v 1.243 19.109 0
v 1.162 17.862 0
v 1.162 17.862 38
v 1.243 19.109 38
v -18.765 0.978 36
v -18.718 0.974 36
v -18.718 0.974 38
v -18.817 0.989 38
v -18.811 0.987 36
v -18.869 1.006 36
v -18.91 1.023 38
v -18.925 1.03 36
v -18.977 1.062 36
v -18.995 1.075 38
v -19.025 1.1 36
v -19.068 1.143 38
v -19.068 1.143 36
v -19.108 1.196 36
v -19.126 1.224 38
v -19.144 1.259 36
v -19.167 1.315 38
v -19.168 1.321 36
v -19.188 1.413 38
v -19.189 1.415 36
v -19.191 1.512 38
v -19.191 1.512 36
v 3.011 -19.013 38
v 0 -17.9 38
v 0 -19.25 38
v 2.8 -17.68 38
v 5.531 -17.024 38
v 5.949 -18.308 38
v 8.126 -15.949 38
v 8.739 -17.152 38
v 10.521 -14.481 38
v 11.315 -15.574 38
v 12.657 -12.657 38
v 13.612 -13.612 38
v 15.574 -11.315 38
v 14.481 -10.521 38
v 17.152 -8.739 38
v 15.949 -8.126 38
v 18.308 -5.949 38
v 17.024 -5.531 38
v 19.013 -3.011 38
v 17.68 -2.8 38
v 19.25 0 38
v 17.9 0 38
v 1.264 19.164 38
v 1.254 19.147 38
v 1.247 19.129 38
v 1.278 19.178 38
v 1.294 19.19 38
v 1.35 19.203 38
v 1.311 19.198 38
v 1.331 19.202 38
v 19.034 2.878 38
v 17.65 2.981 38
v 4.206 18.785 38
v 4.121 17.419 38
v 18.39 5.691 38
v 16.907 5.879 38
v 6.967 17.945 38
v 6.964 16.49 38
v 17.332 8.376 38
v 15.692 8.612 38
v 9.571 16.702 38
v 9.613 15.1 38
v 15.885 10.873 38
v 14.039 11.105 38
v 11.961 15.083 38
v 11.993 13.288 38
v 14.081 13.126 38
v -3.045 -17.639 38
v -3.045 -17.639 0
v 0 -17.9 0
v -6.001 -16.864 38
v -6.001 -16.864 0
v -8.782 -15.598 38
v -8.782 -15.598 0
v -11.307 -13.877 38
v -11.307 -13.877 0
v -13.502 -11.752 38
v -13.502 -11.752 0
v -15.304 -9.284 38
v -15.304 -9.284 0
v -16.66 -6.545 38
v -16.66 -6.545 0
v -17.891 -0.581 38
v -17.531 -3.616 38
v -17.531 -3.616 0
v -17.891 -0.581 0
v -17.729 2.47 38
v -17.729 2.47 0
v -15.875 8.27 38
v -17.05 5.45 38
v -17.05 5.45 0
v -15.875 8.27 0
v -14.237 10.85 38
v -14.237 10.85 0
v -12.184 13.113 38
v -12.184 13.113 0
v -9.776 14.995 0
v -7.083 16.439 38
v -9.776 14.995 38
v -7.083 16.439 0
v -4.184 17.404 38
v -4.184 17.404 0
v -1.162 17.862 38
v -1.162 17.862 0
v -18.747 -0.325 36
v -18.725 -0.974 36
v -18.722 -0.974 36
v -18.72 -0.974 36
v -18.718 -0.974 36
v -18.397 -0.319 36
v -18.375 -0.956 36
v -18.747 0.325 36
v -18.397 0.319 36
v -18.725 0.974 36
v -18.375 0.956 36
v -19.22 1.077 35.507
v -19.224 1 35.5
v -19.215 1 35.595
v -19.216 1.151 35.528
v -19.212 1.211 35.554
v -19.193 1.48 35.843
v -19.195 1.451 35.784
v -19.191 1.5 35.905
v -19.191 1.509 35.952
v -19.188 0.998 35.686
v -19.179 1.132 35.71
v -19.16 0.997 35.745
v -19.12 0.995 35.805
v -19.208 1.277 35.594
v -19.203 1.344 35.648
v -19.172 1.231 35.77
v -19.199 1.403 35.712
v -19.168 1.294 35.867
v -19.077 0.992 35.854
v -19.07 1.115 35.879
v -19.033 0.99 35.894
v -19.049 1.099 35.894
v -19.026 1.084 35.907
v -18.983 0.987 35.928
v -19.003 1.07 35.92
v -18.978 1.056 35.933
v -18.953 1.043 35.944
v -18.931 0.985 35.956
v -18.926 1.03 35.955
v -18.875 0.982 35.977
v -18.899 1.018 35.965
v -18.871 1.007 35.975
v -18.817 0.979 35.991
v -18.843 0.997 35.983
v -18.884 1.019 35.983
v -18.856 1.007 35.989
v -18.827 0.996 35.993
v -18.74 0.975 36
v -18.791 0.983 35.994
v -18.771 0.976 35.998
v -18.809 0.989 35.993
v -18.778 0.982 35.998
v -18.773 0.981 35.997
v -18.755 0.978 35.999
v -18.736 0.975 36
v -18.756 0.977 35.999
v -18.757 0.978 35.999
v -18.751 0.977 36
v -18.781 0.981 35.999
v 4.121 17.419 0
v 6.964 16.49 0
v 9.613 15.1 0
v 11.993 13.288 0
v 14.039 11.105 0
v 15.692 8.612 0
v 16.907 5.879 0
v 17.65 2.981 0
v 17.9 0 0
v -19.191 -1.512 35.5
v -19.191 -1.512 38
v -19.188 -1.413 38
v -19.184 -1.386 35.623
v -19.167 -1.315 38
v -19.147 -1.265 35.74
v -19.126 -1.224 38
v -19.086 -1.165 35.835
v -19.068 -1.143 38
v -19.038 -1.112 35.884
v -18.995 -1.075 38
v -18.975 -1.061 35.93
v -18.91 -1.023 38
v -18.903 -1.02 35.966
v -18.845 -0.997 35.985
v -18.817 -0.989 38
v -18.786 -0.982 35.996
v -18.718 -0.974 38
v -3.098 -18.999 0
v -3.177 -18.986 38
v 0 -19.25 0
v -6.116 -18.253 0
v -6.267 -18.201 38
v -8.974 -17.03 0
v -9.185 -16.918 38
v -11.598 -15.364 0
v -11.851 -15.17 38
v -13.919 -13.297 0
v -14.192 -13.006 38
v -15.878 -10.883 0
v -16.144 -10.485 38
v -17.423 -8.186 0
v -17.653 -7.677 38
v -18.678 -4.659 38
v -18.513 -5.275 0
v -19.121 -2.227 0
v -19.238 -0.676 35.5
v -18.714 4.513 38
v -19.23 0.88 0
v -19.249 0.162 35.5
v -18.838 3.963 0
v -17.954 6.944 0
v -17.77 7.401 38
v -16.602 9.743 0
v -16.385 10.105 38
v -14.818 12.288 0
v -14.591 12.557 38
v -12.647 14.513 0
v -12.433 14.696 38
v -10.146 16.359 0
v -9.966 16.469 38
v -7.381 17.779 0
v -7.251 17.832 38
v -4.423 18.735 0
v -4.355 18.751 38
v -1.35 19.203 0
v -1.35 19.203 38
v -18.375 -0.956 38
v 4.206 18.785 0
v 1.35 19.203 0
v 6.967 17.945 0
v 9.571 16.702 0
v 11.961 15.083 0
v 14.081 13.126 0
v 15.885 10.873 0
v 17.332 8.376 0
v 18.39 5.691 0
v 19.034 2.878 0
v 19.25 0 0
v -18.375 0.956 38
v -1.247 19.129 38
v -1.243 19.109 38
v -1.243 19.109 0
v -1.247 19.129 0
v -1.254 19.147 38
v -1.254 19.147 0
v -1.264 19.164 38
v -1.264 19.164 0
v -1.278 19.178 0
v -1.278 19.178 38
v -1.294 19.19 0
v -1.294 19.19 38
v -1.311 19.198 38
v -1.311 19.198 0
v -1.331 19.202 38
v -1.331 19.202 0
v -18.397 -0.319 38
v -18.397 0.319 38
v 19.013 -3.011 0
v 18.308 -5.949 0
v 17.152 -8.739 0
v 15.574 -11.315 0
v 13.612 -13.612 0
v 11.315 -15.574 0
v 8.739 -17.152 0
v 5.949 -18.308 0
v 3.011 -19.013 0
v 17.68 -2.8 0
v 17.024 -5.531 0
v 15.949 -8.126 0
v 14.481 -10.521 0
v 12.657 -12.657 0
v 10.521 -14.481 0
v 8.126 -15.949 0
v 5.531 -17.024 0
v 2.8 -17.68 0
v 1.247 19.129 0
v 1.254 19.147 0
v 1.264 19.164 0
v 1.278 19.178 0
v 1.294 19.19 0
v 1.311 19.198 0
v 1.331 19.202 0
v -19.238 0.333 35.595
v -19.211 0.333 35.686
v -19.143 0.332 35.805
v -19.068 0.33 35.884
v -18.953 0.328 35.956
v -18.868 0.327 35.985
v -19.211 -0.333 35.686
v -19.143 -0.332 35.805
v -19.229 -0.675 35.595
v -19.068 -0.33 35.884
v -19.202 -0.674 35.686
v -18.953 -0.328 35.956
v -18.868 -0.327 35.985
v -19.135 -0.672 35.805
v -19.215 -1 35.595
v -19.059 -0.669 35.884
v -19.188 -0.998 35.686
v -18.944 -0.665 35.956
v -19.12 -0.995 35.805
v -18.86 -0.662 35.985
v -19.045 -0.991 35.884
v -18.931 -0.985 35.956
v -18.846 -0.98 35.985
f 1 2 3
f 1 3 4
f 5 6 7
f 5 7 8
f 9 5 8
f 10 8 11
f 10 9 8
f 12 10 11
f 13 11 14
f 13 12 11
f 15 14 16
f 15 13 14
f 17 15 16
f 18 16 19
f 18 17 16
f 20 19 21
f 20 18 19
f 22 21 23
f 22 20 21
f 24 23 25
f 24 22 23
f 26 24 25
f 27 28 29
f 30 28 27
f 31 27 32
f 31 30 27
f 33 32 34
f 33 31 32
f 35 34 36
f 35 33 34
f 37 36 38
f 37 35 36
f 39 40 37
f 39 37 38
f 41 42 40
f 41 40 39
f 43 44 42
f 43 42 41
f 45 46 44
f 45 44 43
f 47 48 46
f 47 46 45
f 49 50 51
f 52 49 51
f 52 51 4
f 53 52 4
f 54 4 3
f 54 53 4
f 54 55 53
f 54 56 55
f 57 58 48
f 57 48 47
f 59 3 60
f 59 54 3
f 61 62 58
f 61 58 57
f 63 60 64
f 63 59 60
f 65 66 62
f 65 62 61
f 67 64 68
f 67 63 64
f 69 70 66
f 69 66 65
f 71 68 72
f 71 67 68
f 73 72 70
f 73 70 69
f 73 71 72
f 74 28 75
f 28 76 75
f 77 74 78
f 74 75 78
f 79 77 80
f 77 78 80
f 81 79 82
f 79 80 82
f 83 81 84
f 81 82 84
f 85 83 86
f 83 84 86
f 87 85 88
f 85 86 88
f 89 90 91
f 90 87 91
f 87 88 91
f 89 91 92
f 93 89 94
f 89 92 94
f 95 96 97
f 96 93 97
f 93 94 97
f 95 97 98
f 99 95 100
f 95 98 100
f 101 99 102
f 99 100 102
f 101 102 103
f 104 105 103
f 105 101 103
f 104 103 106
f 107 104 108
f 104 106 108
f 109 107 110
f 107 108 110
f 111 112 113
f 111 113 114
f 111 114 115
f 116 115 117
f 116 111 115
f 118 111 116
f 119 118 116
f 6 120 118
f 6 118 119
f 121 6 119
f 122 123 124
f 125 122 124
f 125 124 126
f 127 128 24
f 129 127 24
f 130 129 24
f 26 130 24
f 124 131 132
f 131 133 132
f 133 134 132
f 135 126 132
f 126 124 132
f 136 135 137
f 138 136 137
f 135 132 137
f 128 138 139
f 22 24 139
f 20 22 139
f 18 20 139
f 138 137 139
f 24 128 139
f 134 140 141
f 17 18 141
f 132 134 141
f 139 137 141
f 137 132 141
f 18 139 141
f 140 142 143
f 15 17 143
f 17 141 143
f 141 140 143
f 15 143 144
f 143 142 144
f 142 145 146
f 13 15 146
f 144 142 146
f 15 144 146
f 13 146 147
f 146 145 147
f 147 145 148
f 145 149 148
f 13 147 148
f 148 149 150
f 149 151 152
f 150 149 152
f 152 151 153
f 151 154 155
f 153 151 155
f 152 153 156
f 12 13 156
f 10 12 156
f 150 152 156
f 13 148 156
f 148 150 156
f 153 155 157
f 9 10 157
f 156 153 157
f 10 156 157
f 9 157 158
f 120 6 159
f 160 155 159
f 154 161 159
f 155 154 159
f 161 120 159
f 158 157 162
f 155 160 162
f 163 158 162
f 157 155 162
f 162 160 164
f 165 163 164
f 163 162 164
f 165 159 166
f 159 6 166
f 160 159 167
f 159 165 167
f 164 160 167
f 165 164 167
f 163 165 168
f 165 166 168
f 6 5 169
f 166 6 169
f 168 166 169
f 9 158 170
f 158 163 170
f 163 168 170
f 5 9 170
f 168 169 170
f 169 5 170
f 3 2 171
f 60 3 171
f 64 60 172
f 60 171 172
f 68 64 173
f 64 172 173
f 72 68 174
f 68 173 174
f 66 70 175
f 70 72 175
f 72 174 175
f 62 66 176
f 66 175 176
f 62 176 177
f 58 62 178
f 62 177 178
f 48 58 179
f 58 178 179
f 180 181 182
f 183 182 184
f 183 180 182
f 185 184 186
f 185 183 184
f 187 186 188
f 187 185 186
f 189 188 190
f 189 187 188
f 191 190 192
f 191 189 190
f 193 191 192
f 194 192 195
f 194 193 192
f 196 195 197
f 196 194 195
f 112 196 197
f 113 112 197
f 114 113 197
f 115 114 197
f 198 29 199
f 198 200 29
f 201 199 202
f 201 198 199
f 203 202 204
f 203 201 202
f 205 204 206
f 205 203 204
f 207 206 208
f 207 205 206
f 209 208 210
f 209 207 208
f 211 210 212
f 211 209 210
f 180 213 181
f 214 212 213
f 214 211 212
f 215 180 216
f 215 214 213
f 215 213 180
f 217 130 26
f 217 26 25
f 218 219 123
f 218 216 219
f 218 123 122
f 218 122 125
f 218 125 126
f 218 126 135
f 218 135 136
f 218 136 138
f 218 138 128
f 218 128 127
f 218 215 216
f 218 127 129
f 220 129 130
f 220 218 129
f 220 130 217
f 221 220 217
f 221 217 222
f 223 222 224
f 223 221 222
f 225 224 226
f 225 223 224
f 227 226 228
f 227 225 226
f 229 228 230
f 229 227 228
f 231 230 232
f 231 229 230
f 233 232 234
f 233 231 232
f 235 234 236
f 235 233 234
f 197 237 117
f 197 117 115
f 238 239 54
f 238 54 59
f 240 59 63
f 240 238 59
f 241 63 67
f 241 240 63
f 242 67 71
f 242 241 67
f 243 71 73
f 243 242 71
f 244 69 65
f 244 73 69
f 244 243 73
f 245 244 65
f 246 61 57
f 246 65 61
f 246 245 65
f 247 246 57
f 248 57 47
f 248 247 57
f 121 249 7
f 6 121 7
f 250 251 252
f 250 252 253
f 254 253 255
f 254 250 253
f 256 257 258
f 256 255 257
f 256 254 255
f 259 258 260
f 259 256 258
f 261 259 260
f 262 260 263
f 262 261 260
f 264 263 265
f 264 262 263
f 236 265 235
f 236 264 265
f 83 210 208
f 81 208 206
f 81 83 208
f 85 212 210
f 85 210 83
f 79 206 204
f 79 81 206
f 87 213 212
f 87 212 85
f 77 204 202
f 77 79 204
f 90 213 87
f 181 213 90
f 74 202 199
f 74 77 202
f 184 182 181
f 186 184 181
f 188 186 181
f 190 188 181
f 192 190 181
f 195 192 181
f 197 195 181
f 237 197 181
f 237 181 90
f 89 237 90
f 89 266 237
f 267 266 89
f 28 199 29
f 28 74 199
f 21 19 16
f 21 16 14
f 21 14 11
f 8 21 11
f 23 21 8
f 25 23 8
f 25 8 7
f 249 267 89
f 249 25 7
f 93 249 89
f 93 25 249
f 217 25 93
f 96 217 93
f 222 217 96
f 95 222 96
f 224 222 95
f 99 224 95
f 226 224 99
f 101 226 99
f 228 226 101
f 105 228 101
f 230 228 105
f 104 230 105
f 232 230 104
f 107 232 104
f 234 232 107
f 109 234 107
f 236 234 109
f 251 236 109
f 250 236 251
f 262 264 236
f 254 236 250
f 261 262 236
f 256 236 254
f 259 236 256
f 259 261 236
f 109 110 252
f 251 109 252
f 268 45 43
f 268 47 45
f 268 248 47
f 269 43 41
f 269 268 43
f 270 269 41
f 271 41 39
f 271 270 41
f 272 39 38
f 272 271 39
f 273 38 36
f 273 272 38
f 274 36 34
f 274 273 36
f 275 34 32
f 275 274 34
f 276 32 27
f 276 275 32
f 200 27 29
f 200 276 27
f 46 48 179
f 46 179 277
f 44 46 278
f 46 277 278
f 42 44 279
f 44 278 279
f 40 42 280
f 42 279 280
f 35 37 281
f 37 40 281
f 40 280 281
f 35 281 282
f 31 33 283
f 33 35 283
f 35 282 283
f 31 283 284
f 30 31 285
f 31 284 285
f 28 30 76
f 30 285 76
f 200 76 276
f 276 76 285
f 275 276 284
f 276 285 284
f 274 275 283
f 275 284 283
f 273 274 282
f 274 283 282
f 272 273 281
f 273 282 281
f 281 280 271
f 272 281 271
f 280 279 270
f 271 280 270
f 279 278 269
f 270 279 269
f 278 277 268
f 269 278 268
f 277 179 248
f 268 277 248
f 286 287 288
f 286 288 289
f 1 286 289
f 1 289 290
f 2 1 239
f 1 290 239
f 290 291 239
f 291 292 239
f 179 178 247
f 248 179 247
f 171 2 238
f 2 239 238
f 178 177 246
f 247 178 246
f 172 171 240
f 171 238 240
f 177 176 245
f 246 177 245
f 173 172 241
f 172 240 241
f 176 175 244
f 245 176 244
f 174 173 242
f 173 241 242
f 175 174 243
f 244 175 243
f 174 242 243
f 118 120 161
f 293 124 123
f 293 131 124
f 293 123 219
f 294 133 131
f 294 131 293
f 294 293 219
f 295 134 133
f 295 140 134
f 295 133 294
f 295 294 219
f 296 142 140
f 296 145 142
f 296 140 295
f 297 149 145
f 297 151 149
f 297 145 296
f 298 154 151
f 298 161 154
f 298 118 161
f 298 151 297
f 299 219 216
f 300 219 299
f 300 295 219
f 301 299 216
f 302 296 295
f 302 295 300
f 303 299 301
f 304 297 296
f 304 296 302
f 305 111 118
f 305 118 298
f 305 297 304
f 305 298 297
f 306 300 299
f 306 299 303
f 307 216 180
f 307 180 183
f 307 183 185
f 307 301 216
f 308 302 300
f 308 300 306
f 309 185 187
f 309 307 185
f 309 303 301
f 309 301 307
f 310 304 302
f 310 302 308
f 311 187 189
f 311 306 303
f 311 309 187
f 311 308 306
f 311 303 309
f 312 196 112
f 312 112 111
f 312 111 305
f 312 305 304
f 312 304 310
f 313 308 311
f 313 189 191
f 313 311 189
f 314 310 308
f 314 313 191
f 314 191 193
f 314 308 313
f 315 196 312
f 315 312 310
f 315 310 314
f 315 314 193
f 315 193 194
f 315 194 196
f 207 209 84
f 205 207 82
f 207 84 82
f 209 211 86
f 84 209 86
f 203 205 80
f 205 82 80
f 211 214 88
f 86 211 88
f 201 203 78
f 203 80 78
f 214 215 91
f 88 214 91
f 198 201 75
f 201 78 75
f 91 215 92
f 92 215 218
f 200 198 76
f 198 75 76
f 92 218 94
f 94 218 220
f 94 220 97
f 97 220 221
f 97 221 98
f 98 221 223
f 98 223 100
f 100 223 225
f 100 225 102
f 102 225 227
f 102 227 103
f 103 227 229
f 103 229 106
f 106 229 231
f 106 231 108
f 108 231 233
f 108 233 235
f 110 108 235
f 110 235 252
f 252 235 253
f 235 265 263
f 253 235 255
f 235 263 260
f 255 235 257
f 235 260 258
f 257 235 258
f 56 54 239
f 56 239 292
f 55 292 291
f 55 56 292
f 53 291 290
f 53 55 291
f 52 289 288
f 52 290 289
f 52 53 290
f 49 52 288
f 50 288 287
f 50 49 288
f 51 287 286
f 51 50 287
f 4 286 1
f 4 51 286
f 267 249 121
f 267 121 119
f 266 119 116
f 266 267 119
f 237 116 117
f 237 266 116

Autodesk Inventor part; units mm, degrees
ref_plane "YZ Plane" through (0, 0, 0) normal (1, 0, 0) x (0, 1, 0)
ref_plane "XZ Plane" through (0, 0, 0) normal (0, 1, 0) x (-1, 0, 0)
ref_plane "XY Plane" through (0, 0, 0) normal (0, 0, 1) x (1, 0, 0)
sketch "スケッチ1" plane through (0, 0, 0) normal (0, 0, 1) x (1, 0, 0)
  circle A0 centre (0, 0) radius 17.9
  circle A1 centre (0, 0) radius 19.25
  line L0 (0, 0) -> (1.25, 19.2094)
  line L1 (0, 0) -> (-1.25, 19.2094)
  line L2 (0, -26.95) -> (0, 26.95) projected
  point P0 (1.1623, 17.8622)
  point P1 (-1.1623, 17.8622)
  dimension "d0" = 35.8
  dimension "d1" = 38.5
  dimension "d4" = 2.5
extrude "押し出し1" add sketch "スケッチ1" along normal blind 38 contours A0 L0 A1 L2 | L2 A1 L1 A0 picked at (1.4278, -18.6391) picked at (-2.7104, 18.4842)
sketch "スケッチ2" plane through (0, 0, 38) normal (0, 0, 1) x (1, 0, 0)
  line L0 (0, 0) -> (-19.224, -1)
  arc A0 (-1.25, 19.2094) -> (1.25, 19.2094) centre (0, 0) ccw projected
  line L1 (0, 0) -> (-19.224, 1)
  line L2 (-26.95, 0) -> (26.95, 0) projected
  arc A1 (-18.3752, 0.9558) -> (-18.3752, -0.9558) centre (0, 0) ccw
  arc A2 (-1.1623, 17.8622) -> (1.1623, 17.8622) centre (0, 0) ccw projected
  dimension "d5" = 2
  dimension "d6" = 0.5
extrude "押し出し2" cut sketch "スケッチ2" against normal blind 2 contours L0 A0 L2 A1 | L2 A0 L1 A1
fillet "フィレット1" radius 0.5 3 edges at (-19.25, 0, 36) (-19.224, -1, 37) (-19.224, 1, 37)
sketch "スケッチ3" plane through (0, 0, 0) normal (0, 1, 0) x (-1, 0, 0)
  line L0 (-18, 30) -> (18, 30)
  line L1 (18, 30) -> (18, 10.5)
  line L2 (18, 10.5) -> (-18, 10.5)
  line L3 (-18, 10.5) -> (-18, 30)
  line L4 (19.1905, 38) -> (-19.25, 38) projected
  point P0 (0, 0)
  point P1 (-1.25, 38)
  point P2 (0, 10.5)
  dimension "d10" = 8
  dimension "d11" = 19.5
  dimension "d12" = 36
sketch3d "3D スケッチ1"
split_face "分割1"
fillet "フィレット2" radius 0.1 2 edges at (-1.25, 19.2094, 19) (1.25, 19.2094, 19)
properties part number "555_Outer" material "鉄、鋳鉄"
